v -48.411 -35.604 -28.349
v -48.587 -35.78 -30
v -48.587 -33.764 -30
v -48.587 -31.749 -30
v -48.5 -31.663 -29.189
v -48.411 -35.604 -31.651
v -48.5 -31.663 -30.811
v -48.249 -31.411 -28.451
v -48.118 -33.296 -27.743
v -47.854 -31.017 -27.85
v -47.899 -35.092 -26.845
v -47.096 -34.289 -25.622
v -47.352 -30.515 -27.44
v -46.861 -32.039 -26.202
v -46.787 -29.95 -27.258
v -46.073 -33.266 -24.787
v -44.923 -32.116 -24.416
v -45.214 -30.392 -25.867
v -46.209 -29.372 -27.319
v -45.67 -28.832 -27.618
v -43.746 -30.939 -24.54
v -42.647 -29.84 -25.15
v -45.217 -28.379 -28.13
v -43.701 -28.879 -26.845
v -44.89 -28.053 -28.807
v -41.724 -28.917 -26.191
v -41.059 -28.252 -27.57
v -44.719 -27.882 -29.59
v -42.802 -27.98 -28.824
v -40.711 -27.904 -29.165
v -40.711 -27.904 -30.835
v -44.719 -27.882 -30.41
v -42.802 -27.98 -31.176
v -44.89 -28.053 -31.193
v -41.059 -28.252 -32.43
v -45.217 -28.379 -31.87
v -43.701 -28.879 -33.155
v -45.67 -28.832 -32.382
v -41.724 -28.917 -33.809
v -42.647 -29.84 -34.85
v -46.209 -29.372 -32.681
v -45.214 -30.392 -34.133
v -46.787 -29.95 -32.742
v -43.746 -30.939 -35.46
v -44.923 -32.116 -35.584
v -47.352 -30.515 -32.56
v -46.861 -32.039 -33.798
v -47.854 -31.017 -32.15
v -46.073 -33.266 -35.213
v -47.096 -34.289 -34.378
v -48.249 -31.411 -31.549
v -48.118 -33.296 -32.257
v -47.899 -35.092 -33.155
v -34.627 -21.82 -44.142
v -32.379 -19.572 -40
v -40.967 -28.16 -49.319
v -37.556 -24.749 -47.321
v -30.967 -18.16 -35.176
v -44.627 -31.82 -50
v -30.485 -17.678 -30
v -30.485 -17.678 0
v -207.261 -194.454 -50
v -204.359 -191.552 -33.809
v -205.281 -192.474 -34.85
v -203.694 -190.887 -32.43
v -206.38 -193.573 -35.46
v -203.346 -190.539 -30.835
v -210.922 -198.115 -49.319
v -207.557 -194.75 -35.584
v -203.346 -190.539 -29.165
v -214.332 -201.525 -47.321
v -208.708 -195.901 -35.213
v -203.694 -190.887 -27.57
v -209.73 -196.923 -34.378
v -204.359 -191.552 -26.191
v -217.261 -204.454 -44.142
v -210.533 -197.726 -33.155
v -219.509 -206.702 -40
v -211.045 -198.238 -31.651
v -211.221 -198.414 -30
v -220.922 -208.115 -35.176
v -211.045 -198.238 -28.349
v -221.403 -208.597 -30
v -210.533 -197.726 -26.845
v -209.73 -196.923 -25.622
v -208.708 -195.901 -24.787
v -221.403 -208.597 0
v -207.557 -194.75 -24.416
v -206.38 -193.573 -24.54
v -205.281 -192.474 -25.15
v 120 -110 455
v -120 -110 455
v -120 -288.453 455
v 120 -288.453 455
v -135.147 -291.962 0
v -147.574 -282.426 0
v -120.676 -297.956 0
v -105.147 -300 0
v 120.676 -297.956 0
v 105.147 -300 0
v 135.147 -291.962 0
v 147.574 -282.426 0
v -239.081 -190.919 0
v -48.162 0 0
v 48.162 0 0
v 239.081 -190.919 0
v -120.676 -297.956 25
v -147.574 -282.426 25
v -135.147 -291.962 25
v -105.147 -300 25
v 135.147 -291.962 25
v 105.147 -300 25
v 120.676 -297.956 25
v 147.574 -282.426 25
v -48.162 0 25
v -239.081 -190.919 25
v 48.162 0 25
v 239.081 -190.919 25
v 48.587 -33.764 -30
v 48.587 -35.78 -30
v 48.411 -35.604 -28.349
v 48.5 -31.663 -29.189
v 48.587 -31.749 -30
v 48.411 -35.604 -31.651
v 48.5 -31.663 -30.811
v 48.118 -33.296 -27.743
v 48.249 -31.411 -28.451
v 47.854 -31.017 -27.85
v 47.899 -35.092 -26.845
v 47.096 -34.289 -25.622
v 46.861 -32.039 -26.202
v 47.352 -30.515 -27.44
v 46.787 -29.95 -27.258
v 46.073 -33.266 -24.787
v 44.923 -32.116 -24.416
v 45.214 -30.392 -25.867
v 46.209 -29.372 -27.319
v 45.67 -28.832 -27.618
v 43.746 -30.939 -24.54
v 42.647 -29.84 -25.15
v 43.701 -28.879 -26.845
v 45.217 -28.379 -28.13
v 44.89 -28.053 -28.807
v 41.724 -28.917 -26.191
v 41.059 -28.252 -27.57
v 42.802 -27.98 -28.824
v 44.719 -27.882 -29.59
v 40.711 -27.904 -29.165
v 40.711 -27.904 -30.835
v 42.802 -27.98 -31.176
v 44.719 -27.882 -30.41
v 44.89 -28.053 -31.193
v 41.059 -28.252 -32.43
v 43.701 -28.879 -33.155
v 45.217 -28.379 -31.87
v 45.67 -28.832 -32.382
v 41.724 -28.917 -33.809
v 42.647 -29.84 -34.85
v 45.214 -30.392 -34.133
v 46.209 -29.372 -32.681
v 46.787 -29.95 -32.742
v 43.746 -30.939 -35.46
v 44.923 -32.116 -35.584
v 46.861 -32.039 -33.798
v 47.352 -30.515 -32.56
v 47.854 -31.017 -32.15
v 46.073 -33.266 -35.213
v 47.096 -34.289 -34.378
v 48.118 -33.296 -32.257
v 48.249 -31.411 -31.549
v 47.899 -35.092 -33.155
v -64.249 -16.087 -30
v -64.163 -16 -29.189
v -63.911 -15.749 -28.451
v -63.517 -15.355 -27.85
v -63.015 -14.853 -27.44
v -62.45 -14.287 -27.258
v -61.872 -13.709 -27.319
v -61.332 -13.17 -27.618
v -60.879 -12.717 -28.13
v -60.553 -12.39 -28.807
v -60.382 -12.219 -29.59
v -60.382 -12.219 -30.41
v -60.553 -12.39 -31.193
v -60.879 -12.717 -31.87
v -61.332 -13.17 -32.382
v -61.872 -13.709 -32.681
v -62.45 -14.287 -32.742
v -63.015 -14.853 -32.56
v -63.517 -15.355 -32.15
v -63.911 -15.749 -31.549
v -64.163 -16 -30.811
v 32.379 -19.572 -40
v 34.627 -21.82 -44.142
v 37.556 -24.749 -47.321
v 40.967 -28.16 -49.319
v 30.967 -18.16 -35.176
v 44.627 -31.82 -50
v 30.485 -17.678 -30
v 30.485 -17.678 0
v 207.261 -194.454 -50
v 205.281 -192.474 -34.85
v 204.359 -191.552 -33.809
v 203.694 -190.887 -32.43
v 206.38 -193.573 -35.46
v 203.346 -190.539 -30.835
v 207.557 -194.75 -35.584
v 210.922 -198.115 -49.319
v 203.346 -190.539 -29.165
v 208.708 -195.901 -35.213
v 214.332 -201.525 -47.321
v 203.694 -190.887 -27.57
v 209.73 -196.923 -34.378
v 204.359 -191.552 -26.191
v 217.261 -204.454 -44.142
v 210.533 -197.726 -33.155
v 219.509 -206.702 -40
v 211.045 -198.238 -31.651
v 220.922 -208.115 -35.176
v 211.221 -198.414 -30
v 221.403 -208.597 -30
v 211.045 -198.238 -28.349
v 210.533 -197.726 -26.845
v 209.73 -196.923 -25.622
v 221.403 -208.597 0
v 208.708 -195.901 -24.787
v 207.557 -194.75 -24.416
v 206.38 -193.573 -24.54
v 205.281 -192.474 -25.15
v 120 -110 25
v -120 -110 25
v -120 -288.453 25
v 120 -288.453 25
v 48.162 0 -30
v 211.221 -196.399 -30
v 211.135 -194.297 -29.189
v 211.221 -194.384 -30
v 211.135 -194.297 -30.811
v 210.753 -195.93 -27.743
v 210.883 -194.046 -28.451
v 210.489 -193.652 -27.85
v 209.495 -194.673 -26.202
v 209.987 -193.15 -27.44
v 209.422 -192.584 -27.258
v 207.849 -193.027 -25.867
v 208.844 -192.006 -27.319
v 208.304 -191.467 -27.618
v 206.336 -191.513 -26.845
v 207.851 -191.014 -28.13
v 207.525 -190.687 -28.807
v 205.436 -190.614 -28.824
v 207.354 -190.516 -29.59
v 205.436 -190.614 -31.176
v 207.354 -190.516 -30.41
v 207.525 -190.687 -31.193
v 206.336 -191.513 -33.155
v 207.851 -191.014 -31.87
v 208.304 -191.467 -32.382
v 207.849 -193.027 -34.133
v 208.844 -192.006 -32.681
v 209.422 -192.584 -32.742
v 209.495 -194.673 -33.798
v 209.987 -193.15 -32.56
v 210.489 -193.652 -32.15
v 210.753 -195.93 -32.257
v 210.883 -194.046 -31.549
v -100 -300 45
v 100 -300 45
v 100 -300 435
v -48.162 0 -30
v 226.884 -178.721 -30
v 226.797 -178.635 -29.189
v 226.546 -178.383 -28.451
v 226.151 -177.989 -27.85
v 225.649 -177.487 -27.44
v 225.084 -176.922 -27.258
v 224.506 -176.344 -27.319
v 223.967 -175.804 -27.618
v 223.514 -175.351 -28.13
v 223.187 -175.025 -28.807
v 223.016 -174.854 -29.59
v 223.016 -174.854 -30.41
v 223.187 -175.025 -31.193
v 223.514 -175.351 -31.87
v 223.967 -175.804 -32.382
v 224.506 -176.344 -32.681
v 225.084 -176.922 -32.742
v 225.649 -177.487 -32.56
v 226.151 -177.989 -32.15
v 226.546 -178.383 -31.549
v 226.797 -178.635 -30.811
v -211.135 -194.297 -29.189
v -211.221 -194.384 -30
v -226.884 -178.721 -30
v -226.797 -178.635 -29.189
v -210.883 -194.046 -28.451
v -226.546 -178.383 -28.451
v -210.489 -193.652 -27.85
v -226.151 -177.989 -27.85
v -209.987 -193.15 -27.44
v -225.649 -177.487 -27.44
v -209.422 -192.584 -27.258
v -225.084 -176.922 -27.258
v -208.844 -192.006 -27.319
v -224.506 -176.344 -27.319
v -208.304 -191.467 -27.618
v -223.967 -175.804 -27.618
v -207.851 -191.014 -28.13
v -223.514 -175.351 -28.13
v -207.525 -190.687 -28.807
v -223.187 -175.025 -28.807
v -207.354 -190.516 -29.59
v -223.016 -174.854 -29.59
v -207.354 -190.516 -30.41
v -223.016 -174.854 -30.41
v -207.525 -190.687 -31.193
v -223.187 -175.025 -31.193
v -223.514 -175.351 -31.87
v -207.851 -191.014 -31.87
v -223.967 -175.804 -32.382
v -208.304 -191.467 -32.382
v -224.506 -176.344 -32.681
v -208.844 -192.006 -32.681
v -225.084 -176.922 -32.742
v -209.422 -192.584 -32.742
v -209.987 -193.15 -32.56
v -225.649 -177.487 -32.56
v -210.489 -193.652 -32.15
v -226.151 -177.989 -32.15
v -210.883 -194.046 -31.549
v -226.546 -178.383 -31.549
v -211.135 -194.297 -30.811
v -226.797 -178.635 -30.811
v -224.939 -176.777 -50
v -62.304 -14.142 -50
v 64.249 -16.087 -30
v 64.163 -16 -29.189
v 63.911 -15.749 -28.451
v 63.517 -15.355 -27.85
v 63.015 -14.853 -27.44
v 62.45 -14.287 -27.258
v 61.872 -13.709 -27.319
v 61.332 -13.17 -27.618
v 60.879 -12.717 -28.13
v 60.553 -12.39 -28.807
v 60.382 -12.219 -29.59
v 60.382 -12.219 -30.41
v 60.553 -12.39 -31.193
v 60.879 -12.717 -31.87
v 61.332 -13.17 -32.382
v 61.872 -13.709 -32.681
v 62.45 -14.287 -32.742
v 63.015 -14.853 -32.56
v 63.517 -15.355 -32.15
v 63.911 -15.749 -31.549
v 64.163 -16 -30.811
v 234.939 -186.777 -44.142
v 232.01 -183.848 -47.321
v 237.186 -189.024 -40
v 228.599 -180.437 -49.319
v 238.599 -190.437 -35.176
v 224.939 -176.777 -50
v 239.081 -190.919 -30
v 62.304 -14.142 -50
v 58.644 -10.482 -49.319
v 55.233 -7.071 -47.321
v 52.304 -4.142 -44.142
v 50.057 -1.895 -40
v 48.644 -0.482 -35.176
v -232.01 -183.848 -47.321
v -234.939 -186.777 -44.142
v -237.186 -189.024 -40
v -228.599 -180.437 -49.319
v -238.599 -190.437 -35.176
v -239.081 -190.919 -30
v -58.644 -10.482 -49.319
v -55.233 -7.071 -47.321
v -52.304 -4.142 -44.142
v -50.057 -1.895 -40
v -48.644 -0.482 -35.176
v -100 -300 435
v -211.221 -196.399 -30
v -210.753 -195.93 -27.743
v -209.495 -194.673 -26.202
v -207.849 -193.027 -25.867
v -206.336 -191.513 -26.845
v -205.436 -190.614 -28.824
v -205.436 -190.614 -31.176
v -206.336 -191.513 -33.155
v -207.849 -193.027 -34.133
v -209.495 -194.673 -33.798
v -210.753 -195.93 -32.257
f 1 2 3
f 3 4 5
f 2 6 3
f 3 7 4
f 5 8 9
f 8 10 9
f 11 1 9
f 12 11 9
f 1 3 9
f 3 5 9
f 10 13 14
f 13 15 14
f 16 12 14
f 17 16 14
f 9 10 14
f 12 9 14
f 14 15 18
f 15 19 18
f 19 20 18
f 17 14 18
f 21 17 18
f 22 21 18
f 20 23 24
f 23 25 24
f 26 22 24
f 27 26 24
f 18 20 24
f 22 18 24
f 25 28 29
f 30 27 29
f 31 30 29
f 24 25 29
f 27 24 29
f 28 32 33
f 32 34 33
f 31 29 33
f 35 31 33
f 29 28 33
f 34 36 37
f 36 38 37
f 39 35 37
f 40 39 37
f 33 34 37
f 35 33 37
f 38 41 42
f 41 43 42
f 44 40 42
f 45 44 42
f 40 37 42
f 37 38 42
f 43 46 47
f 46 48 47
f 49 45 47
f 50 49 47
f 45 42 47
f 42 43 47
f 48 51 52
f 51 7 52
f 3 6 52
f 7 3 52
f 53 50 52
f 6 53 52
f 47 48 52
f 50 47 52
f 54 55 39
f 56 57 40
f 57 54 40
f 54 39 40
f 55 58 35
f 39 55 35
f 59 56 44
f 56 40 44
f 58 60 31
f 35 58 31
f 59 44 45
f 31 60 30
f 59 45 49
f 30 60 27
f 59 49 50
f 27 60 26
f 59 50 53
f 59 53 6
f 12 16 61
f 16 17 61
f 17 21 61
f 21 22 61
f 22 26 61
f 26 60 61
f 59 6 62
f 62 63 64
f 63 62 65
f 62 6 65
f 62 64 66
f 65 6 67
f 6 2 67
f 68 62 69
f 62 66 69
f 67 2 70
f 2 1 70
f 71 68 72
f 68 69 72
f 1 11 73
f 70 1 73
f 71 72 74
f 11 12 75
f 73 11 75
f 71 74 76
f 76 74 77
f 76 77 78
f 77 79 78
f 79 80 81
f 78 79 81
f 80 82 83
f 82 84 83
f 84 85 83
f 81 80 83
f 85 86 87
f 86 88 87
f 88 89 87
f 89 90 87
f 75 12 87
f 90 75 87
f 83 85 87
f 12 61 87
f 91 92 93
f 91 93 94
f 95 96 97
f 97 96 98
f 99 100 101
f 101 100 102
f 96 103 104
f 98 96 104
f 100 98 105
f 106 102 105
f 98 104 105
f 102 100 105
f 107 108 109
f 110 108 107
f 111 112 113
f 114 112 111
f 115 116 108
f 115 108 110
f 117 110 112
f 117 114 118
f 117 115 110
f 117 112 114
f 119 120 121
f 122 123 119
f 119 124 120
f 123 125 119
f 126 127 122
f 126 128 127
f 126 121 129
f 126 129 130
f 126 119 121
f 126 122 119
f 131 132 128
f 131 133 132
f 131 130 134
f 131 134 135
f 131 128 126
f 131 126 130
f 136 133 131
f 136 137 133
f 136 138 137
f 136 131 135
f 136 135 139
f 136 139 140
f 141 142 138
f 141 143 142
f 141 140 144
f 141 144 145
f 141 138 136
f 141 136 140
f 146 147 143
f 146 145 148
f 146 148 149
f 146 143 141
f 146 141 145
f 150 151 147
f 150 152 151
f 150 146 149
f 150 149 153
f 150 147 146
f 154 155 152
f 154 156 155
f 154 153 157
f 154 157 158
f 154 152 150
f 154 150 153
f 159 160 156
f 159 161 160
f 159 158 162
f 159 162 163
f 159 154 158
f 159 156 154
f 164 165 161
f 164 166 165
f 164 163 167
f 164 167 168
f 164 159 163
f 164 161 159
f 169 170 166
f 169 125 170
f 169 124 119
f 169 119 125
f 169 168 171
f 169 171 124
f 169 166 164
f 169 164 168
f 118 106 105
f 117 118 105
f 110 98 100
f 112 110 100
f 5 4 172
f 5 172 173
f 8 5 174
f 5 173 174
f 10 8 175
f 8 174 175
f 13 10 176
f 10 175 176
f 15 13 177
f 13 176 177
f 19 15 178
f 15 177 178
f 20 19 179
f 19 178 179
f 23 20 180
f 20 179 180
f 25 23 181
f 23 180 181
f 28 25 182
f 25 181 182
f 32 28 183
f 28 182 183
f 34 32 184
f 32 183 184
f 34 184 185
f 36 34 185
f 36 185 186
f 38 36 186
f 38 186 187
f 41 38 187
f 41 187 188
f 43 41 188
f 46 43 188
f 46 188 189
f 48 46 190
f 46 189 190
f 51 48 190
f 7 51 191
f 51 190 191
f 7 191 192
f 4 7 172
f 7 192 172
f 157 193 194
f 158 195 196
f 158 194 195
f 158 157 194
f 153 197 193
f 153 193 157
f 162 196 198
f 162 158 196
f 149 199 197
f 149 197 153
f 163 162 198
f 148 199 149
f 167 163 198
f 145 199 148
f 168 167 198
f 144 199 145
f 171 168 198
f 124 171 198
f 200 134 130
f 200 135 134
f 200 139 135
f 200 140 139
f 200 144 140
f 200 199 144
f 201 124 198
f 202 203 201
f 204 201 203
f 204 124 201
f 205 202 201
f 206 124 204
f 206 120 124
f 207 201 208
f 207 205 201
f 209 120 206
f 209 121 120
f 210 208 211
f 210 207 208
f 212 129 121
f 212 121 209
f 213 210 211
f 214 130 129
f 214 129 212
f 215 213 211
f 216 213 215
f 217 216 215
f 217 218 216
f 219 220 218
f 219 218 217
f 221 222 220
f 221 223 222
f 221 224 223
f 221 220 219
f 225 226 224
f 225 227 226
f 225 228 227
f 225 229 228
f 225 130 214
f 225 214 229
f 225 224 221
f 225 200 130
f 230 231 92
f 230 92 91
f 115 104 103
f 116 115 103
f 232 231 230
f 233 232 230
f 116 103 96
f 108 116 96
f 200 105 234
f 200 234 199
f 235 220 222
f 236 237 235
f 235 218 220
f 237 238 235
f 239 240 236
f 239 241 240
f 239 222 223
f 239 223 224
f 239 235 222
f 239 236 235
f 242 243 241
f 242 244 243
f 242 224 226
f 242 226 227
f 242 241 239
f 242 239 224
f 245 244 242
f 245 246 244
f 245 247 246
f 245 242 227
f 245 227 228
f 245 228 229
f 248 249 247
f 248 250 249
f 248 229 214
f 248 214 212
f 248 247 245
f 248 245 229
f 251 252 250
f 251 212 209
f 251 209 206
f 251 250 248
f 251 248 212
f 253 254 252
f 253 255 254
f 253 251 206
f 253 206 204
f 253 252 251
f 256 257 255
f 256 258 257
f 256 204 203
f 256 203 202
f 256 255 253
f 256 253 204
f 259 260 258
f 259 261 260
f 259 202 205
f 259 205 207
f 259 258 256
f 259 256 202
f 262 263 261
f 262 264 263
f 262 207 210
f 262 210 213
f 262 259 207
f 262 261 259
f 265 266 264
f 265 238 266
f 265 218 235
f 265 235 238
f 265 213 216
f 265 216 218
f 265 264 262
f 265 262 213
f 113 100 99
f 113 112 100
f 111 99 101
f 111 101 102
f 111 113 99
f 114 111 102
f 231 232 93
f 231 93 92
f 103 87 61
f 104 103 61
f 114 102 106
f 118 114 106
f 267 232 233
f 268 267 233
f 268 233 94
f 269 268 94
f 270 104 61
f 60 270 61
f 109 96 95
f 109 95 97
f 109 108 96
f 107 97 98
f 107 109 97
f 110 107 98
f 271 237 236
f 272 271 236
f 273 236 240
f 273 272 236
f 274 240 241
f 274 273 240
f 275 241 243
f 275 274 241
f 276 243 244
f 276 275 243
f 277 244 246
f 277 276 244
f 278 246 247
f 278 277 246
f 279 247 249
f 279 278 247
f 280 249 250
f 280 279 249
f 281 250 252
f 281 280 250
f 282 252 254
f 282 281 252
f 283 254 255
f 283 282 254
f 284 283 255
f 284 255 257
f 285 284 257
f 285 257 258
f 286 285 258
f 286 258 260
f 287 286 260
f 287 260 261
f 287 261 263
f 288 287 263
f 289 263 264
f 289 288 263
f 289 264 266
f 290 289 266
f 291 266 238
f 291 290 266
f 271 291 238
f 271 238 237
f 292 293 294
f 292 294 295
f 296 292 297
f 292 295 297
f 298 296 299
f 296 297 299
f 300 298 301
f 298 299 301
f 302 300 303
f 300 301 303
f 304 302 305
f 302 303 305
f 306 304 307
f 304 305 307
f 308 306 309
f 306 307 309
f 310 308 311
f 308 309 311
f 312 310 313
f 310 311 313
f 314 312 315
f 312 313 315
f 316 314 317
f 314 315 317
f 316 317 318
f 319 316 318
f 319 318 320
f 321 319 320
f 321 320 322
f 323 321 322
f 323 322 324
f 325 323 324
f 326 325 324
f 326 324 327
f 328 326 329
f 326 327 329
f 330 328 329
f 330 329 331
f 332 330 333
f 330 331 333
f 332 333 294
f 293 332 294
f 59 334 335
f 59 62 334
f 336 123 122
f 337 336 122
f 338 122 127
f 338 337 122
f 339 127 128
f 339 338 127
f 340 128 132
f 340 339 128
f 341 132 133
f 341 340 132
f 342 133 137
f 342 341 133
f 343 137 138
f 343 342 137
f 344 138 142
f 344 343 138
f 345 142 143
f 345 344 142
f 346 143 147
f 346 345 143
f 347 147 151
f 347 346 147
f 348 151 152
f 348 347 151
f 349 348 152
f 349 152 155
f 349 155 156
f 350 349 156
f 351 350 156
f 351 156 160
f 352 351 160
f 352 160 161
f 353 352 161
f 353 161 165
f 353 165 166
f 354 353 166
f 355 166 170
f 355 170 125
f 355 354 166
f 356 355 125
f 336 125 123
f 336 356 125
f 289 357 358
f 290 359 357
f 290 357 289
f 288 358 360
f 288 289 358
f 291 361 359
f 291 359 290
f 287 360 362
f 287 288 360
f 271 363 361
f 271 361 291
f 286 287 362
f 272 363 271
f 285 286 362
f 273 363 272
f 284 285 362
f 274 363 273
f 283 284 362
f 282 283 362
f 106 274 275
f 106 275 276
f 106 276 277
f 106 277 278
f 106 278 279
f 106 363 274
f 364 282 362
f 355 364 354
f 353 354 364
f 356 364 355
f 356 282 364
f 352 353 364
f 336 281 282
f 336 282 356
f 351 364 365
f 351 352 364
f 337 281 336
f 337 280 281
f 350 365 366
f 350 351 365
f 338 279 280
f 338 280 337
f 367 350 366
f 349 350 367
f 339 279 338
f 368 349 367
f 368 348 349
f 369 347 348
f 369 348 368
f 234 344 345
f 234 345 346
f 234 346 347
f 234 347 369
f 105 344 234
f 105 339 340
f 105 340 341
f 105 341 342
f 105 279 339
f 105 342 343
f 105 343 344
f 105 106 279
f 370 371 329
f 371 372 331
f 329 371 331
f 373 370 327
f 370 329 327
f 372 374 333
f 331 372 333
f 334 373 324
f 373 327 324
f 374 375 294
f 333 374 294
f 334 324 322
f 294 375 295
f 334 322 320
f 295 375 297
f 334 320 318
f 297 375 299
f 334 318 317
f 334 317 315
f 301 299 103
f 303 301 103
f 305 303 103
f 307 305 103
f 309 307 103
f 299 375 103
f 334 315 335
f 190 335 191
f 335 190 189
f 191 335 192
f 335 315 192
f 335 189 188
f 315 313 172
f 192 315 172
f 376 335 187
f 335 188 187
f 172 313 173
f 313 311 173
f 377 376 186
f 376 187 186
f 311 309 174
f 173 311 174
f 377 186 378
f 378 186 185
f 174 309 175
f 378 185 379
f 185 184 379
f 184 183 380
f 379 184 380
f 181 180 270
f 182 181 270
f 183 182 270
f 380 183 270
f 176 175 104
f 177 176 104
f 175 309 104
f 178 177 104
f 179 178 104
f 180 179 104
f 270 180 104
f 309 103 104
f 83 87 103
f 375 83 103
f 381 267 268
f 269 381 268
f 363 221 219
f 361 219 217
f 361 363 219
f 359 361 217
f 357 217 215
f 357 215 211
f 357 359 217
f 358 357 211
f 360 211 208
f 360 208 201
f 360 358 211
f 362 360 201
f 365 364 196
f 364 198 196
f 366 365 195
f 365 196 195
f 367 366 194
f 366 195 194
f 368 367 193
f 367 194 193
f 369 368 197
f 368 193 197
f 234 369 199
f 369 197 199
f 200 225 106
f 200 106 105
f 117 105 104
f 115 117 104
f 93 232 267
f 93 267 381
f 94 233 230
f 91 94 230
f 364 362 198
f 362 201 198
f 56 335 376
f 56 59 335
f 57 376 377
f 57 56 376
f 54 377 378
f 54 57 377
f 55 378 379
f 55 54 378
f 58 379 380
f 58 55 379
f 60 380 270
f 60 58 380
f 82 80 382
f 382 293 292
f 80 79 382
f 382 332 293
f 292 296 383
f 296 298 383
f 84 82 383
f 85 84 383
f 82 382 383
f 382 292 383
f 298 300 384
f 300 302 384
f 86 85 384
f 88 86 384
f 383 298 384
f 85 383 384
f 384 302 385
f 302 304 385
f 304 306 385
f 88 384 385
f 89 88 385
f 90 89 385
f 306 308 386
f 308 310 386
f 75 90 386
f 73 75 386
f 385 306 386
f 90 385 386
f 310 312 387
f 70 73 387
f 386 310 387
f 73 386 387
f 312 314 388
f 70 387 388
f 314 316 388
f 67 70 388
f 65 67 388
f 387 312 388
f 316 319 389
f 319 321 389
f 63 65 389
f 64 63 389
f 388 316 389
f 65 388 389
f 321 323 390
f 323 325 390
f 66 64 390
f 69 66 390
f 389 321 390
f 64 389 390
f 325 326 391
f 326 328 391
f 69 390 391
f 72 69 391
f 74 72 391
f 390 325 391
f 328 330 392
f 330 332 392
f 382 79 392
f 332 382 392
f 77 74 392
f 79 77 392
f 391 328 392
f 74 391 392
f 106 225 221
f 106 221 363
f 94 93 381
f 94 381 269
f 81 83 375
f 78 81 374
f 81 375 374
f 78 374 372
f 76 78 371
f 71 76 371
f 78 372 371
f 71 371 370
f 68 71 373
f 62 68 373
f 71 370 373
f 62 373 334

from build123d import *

# Parameters (mm, degrees)
F1_DEPTH       = 25
F3_DEPTH       = 50
F5_D           = 5.5
F5_CSINK_D     = 11.2
F5_CSINK_ANGLE = 90
F6_R           = 20
F8_W           = 240
F8_H           = 190
F9_DEPTH       = 430
F10_SIZE2      = 11.5470053838
F10_SIZE       = 20
F11_R          = 60


with BuildPart() as f1:
    # F0 (on Top) → F1 (new body)
    with BuildSketch(Plane.XY):
        Polygon((48.1623381593, 0), (-48.1623381593, 0), (-239.0811690796, -190.9188309204), (-130, -300), (130, -300), (239.0811690796, -190.9188309204), align=None)
    extrude(amount=F1_DEPTH)

    # F11
    f11_edges = [f1.edges().sort_by_distance(p)[0] for p in [
        (130, -300, 12.5),
        (-130, -300, 12.5),
    ]]
    fillet(f11_edges, radius=F11_R)


with BuildPart() as f3:
    # F2 (on face) → F3 (new body)
    with BuildSketch(Plane(origin=(0, 0, 0), x_dir=(1, 0, 0), z_dir=(0, 0, -1))):
        Polygon((-221.40349955, 208.59650045), (-239.0811690796, 190.9188309204), (-48.1623381593, 0), (-30.4846686296, 17.6776695297), align=None)
    extrude(amount=F3_DEPTH)

    # F5 (through all)
    with Locations(Plane(origin=(-6.40349955, 6.40349955, 0), x_dir=(0.7071067812, 0.7071067812, 0), z_dir=(0.7071067812, -0.7071067812, 0))):
        with Locations((-284.0559159102, -30), (-54.0559159102, -30)):
            CounterSinkHole(F5_D / 2, F5_CSINK_D / 2, counter_sink_angle=F5_CSINK_ANGLE)

    # F6
    f6_edges = [f3.edges().sort_by_distance(p)[0] for p in [
        (-230.242334, -199.757666, -50),
        (-39.323503, -8.838835, -50),
    ]]
    fillet(f6_edges, radius=F6_R)


with BuildPart() as f7_1:
    # F7: instance of F3
    add(f3.part.mirror(Plane.YZ))


with BuildPart() as f9:
    # F8 (on face) → F9 (new body)
    with BuildSketch(Plane.XY.offset(25)):
        with Locations((0, -205)):
            Rectangle(F8_W, F8_H)
    extrude(amount=F9_DEPTH)

    # F10
    f10_edges = [f9.edges().sort_by_distance(p)[0] for p in [
        (-120, -300, 240),
        (120, -300, 240),
        (0, -300, 25),
        (0, -300, 455),
    ]]
    f10_side = f9.faces().sort_by_distance((0, -300, 240))[0]
    chamfer(f10_edges, length=F10_SIZE, length2=F10_SIZE2, reference=f10_side)


solid = Compound([f1.part, f3.part, f7_1.part, f9.part])
